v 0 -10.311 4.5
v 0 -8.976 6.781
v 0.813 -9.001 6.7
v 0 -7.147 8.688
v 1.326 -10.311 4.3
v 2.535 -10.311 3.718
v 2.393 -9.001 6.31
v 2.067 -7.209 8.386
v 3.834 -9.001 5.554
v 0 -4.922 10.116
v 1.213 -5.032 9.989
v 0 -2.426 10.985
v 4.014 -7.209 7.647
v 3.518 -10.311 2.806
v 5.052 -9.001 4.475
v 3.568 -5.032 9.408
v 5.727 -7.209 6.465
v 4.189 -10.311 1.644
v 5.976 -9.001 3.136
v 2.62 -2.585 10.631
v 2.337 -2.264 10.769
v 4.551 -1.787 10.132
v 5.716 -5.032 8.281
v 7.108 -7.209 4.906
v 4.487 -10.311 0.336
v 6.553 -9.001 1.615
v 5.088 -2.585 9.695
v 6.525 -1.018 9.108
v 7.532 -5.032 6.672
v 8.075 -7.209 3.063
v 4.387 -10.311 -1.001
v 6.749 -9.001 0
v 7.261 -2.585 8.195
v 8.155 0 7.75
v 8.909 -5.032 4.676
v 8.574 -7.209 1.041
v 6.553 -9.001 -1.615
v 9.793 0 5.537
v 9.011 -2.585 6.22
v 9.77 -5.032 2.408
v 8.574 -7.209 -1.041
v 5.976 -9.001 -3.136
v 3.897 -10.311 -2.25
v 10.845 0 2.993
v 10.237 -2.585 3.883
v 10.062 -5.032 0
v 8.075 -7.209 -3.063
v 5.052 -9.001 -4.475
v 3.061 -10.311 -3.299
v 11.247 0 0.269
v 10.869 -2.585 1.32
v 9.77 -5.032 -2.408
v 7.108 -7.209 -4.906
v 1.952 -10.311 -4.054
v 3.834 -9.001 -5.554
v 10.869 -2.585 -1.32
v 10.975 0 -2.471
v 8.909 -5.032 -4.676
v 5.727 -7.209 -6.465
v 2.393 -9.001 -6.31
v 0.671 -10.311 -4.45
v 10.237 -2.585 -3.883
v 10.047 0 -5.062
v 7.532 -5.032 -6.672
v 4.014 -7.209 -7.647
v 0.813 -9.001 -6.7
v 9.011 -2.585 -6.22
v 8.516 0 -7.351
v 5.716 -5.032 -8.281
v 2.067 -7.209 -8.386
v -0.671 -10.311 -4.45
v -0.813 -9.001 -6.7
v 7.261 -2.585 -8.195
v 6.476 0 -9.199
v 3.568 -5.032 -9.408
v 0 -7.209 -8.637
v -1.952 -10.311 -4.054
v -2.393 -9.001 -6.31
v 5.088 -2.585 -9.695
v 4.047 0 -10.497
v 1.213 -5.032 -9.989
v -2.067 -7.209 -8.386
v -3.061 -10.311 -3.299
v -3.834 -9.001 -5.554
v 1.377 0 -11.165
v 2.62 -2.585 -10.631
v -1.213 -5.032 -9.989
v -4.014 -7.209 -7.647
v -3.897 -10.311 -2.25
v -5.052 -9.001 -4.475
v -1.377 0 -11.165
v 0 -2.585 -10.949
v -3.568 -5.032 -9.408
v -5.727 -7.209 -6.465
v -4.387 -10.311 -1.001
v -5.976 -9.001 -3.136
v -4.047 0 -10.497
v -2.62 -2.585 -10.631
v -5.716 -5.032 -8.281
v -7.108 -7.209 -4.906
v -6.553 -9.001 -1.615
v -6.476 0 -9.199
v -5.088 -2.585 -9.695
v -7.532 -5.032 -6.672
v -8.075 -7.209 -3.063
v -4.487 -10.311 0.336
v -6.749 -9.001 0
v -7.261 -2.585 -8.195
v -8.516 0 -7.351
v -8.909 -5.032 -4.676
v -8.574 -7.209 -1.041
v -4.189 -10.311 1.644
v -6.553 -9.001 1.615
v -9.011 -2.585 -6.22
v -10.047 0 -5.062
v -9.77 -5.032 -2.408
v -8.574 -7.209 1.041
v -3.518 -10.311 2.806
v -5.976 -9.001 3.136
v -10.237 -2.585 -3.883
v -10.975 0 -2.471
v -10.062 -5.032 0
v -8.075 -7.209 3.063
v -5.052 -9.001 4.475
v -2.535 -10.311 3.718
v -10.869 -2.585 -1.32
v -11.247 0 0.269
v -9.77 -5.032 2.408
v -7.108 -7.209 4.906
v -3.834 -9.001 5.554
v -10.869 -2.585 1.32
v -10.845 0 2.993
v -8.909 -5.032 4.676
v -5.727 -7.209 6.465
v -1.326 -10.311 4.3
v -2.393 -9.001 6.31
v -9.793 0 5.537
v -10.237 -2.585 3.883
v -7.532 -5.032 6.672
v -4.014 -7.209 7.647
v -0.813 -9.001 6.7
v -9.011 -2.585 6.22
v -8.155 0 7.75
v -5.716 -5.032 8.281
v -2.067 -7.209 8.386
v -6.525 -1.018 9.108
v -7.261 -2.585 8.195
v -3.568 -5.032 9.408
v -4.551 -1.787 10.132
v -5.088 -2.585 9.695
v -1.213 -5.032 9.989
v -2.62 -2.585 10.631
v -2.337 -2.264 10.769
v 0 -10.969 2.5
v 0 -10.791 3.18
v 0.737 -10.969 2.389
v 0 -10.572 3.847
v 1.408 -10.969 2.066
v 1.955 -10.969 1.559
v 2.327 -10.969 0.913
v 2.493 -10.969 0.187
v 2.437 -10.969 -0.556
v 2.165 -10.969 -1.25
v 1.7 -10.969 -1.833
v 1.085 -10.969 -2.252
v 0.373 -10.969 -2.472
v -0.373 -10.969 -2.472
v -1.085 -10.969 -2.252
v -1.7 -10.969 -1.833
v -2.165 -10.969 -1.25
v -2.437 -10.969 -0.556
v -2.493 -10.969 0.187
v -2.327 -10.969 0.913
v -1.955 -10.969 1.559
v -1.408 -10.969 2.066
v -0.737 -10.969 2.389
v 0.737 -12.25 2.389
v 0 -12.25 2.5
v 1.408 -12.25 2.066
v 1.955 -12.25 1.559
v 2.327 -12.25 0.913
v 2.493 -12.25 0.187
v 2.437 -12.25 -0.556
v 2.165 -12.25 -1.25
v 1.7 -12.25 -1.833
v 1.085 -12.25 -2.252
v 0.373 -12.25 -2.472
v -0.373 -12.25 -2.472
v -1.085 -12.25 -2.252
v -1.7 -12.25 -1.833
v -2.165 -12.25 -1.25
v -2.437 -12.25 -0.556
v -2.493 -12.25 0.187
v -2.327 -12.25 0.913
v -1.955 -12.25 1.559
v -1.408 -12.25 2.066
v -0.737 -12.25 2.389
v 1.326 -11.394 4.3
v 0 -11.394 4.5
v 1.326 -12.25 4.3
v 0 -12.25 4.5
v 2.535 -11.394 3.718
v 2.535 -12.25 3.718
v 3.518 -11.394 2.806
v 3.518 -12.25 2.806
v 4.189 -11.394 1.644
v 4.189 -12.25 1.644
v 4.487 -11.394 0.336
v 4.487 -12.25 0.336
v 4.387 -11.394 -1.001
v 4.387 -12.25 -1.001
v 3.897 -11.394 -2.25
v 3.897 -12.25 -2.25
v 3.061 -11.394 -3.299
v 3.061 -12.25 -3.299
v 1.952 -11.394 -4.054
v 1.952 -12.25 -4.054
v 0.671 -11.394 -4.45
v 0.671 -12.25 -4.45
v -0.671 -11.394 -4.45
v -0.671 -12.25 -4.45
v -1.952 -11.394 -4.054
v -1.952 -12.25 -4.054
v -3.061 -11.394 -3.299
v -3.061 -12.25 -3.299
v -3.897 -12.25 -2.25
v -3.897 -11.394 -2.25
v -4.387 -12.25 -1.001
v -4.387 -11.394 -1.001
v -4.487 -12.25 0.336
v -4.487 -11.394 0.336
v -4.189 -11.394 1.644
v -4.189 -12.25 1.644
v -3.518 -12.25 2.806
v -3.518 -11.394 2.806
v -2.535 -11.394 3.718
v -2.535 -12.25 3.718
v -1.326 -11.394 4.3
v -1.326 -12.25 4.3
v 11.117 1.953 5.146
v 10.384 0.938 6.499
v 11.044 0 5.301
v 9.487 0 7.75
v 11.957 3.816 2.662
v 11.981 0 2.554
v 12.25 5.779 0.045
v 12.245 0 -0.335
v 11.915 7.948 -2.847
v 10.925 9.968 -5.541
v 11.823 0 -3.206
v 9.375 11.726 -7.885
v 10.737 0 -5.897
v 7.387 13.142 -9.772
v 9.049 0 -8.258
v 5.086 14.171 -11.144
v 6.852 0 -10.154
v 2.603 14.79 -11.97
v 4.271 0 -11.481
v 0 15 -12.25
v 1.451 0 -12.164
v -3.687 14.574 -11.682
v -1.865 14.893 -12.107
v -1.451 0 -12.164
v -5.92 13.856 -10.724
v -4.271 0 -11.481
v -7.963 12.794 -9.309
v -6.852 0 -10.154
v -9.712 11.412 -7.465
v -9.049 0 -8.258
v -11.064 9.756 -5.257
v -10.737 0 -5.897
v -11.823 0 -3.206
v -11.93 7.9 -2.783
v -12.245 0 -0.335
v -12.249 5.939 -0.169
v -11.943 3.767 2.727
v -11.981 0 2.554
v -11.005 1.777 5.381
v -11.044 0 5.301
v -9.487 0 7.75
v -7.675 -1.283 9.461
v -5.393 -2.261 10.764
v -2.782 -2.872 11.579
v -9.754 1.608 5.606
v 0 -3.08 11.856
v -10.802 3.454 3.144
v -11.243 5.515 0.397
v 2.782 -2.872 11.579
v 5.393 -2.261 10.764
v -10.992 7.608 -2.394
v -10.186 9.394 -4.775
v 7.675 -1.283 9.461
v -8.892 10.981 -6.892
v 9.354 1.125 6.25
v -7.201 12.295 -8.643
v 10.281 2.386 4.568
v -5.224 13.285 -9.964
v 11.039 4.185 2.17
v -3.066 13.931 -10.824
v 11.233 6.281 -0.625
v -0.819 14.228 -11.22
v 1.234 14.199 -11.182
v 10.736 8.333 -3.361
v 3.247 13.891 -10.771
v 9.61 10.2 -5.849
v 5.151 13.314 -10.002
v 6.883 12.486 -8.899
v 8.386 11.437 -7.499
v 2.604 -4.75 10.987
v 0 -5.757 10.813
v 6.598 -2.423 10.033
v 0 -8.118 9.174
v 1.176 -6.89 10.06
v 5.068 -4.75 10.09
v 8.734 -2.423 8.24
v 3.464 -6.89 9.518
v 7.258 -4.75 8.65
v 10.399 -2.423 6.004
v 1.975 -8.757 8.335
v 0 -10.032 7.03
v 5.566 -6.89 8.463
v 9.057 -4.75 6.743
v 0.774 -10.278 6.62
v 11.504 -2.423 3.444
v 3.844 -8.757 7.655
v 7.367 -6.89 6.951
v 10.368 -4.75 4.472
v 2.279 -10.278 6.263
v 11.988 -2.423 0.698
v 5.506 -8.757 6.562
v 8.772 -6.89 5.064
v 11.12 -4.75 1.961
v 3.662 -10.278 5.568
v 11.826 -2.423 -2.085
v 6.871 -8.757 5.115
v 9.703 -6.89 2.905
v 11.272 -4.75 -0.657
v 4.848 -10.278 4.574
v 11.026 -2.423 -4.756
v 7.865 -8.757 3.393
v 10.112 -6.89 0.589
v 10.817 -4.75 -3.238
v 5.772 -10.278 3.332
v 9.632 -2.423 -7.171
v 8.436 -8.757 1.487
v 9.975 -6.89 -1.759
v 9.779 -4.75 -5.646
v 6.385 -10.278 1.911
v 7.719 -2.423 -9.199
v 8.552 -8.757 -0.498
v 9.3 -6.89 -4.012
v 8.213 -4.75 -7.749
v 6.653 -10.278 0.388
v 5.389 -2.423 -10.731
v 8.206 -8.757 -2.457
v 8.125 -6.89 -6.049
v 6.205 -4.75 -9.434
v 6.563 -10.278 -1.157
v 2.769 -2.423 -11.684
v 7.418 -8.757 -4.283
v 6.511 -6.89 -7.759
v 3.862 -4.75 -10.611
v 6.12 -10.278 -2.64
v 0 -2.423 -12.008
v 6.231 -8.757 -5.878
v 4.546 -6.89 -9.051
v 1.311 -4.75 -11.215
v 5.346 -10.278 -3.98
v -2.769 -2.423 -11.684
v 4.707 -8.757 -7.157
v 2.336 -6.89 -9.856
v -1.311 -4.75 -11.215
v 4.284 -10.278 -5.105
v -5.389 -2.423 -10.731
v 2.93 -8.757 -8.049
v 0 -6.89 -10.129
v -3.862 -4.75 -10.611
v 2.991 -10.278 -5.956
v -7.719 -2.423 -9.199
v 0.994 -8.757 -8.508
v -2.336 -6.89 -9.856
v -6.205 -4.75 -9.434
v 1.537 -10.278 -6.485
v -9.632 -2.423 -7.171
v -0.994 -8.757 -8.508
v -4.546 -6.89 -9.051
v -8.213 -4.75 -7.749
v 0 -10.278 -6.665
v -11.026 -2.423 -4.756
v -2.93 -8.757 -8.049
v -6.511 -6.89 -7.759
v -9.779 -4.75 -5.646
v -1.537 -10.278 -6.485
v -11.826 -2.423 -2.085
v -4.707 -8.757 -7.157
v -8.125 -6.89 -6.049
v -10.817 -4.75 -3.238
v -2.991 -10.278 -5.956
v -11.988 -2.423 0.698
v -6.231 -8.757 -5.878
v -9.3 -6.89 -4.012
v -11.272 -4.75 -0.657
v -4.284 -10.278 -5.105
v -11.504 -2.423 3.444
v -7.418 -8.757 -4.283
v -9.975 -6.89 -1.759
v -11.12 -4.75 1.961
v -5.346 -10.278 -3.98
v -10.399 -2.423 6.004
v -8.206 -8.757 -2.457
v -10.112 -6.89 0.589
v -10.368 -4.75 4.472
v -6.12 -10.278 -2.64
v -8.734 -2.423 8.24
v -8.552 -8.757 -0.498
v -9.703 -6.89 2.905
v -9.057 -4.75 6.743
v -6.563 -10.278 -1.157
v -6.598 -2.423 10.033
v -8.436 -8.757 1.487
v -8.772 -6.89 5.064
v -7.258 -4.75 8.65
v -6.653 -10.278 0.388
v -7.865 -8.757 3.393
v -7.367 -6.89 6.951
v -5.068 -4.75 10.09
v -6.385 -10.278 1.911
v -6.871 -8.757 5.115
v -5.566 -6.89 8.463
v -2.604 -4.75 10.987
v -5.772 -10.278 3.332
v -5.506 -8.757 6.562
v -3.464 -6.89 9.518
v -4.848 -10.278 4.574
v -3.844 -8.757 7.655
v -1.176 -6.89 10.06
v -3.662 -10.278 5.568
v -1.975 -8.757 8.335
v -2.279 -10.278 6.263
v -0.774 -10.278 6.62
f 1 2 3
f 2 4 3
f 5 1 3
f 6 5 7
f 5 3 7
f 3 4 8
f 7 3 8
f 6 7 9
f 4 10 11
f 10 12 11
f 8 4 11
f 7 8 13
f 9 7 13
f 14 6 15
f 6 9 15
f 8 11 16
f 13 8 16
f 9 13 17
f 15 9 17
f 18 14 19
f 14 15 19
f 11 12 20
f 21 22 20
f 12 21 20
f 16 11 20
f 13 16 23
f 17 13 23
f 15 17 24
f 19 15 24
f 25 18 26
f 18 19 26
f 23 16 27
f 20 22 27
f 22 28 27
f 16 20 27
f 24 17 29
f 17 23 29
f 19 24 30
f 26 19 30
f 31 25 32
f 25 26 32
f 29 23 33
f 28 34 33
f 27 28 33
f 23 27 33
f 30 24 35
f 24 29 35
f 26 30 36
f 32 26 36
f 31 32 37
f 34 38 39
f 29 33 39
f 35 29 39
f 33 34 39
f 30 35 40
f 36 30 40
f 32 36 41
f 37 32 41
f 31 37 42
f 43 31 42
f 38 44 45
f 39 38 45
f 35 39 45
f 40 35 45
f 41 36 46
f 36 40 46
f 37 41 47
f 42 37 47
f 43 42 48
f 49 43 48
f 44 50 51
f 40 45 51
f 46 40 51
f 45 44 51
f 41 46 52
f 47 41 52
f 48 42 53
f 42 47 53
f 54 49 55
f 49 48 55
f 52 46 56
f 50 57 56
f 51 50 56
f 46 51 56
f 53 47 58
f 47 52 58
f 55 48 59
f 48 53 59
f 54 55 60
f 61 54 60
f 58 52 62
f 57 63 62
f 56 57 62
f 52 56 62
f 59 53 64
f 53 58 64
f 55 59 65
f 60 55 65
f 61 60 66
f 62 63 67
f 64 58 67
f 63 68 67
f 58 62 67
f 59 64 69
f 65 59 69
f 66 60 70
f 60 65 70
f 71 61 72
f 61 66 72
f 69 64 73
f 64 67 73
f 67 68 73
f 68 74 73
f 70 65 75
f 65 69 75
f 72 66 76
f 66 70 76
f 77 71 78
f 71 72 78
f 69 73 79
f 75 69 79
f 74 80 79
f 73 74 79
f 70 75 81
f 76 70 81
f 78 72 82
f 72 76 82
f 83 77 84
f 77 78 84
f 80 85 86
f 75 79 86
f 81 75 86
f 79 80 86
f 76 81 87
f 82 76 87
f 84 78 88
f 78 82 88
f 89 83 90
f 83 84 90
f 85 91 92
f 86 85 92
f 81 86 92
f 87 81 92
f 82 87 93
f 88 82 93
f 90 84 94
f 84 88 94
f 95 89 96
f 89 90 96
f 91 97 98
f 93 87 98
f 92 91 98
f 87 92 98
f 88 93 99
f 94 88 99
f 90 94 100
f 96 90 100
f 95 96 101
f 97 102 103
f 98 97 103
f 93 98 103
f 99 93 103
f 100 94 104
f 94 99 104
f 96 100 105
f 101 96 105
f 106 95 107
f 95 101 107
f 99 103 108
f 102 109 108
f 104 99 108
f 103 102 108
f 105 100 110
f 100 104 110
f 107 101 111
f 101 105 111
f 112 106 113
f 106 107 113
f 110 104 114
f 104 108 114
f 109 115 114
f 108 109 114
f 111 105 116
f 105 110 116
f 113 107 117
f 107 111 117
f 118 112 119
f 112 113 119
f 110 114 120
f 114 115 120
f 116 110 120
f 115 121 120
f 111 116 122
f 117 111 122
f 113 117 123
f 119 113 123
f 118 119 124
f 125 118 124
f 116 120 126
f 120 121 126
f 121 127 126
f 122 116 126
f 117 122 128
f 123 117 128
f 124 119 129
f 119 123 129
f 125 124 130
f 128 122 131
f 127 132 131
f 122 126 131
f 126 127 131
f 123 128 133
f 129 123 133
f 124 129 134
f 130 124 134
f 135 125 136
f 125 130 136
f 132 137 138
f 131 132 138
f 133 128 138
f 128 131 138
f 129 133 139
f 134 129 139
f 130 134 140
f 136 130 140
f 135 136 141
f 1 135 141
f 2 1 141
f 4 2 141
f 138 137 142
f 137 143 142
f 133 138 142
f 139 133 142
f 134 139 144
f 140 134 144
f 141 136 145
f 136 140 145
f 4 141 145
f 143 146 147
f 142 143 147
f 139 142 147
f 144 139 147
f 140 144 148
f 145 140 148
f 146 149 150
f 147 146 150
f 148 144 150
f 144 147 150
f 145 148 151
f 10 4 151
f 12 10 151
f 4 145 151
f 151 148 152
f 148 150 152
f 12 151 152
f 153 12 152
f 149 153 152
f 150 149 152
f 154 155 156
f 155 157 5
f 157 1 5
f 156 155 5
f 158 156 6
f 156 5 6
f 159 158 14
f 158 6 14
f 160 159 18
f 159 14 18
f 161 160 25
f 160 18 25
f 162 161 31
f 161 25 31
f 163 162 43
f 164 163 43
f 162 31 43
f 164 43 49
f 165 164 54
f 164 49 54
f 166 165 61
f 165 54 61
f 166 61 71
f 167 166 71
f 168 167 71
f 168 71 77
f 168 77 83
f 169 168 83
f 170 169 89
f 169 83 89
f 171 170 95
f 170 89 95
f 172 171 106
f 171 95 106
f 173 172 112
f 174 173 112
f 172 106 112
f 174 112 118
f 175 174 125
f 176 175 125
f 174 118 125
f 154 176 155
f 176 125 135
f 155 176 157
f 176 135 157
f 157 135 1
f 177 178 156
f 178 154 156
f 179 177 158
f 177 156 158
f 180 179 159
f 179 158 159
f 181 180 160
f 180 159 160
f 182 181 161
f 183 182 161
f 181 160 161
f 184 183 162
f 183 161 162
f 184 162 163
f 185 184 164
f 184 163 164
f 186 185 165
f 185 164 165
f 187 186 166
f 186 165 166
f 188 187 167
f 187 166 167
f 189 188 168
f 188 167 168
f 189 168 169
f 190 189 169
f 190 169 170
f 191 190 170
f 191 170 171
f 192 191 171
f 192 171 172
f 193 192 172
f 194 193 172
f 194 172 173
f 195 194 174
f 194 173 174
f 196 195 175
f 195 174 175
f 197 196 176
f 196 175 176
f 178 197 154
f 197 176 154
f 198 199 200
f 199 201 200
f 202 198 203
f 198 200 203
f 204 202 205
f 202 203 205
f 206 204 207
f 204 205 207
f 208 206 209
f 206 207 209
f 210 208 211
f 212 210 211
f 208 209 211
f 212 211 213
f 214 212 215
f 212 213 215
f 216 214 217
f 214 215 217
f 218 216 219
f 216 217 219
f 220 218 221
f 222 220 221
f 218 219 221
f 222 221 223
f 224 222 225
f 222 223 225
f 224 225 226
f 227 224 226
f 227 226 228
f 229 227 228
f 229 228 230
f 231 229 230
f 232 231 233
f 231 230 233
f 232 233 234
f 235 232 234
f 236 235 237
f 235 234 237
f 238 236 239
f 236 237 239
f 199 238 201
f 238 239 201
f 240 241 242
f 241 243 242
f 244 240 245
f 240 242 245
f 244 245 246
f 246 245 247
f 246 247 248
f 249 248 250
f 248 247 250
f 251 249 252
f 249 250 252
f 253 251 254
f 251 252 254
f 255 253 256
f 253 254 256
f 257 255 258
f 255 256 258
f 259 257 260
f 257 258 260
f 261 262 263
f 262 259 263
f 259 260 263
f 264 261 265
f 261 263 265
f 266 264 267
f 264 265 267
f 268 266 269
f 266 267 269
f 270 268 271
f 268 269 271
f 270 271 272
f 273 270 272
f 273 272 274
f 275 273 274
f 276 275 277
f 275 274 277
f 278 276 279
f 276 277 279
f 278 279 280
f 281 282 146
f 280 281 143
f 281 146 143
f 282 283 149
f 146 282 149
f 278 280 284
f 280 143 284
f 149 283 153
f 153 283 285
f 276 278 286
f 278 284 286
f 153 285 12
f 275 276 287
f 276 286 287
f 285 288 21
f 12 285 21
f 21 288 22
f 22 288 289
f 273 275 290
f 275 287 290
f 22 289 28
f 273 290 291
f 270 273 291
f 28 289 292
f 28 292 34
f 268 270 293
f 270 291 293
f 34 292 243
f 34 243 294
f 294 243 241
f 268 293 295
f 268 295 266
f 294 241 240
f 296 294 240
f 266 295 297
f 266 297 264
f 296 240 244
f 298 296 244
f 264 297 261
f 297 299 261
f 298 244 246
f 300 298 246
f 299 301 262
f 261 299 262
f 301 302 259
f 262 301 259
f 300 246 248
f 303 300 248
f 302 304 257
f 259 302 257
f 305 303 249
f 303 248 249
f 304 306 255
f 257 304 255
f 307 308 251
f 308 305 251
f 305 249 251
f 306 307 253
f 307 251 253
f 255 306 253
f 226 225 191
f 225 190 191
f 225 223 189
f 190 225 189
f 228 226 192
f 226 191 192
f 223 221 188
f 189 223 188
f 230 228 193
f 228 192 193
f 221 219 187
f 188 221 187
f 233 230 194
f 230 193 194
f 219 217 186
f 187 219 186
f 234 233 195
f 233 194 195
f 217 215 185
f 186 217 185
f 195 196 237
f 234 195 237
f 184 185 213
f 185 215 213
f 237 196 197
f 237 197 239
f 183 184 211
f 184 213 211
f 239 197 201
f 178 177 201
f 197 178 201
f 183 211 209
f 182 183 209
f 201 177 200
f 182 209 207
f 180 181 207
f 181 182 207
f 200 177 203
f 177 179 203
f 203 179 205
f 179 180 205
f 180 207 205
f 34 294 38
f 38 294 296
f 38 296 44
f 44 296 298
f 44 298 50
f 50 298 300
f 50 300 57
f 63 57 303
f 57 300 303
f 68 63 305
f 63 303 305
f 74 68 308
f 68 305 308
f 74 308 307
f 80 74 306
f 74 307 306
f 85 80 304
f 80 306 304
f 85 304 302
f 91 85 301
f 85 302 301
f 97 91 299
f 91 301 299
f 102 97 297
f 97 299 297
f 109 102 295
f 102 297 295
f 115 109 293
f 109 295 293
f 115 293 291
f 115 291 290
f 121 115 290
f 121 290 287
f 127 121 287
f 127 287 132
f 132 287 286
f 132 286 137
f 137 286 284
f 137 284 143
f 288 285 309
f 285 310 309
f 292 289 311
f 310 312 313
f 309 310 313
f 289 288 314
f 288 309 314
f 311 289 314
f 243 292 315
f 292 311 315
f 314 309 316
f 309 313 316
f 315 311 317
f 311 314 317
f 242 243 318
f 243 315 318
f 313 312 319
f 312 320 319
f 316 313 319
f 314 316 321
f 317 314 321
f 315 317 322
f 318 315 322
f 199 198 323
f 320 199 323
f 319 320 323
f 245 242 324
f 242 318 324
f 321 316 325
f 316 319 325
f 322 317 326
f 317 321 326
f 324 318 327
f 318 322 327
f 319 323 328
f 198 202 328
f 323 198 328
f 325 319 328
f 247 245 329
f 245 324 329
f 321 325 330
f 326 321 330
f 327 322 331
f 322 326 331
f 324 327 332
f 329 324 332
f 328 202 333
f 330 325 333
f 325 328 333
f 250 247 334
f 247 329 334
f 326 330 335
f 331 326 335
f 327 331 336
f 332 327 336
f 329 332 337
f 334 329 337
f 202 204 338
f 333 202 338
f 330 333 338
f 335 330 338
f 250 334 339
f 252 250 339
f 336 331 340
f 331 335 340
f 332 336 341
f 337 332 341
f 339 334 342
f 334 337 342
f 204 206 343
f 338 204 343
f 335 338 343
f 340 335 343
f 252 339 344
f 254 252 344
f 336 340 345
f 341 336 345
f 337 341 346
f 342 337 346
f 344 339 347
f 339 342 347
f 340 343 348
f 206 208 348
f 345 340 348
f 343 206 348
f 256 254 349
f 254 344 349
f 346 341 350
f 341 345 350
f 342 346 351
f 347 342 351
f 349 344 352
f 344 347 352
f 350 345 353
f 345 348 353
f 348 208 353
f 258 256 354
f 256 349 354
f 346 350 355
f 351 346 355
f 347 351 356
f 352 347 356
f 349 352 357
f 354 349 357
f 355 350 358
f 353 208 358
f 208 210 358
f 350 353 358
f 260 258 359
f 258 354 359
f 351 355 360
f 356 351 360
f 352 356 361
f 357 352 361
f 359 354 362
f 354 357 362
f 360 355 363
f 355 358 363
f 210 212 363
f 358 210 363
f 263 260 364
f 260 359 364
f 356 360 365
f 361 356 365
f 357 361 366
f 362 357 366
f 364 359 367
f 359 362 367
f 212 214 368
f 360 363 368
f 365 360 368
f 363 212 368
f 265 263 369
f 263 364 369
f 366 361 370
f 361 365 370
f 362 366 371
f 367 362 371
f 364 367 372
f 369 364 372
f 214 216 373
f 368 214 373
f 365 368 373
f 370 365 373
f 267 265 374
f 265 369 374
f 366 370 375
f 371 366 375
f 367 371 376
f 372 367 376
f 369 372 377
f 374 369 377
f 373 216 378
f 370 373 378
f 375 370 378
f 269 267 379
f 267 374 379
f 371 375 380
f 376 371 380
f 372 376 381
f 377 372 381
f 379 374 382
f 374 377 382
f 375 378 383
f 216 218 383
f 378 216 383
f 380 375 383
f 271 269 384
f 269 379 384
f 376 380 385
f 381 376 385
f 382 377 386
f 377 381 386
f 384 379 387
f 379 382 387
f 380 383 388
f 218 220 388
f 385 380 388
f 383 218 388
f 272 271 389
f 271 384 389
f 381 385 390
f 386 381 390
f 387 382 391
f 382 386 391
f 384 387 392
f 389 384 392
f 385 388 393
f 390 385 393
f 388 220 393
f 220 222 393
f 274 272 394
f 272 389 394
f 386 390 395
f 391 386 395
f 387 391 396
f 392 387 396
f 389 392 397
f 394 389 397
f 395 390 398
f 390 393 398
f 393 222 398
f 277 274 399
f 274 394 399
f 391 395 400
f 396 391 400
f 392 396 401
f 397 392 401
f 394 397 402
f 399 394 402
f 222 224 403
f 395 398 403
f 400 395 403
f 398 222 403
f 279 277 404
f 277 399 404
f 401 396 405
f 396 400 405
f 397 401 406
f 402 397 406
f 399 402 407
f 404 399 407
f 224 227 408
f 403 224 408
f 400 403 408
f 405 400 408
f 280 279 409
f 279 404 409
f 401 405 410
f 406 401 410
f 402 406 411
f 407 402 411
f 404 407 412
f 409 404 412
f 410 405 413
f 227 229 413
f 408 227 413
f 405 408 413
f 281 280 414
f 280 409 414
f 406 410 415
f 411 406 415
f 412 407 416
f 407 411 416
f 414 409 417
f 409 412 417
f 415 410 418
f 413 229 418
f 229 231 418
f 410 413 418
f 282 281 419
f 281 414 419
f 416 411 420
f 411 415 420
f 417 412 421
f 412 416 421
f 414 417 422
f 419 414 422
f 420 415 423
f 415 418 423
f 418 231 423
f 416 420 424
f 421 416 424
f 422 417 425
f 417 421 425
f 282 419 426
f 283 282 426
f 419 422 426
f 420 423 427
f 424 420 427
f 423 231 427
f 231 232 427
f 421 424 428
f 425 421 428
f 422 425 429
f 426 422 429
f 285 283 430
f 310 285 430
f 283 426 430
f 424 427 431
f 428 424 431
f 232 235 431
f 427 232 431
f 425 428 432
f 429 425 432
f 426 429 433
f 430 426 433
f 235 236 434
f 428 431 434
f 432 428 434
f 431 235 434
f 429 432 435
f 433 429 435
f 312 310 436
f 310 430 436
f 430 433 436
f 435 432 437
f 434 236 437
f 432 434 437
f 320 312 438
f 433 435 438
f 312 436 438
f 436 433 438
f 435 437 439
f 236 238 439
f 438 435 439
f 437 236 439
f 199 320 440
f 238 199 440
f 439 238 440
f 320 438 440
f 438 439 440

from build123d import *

# Parameters (mm, degrees)
F3_DEPTH = 15


with BuildPart() as f1:
    # F0 (on Right) → F1 (revolve)
    with BuildSketch(Plane.YZ):
        with BuildLine():
            Line((15, 12.25), (1.288e-07, 12.25))
            ThreePointArc((1.288e-07, 12.25), (-6.8897568365, 10.1288573262), (-11.3935288651, 4.5))
            Line((-11.3935288651, 4.5), (-10.3107953137, 4.5))
            ThreePointArc((-10.3107953137, 4.5), (-6.1618787719, 9.4124252985), (0, 11.25))
            Line((0, 11.25), (15, 11.25))
            Line((15, 11.25), (15, 12.25))
        make_face()
        with BuildLine():
            Line((-10.3107953137, 4.5), (-11.3935288651, 4.5))
            ThreePointArc((-11.3935288651, 4.5), (-11.7355401547, 3.5127762921), (-11.9921849552, 2.5))
            Line((-11.9921849552, 2.5), (-10.9687054842, 2.5))
            ThreePointArc((-10.9687054842, 2.5), (-10.6866406579, 3.5154247891), (-10.3107953137, 4.5))
        make_face()
        with BuildLine():
            ThreePointArc((-11.9921849552, 2.5), (-11.7355401547, 3.5127762921), (-11.3935288651, 4.5))
            Line((-11.3935288651, 4.5), (-12.25, 4.5))
            Line((-12.25, 4.5), (-12.25, 2.5))
            Line((-12.25, 2.5), (-11.9921849552, 2.5))
        make_face()
    revolve(axis=Axis((0, 1.375, 3.22e-08), (0, 1, -2.4e-09)))

    # F2 (on Right) → F3 (cut, symmetric)
    with BuildSketch(Plane.YZ):
        Polygon((-12.7222961238, 24.7129239332), (15, -12.25), (15, 24.7129239332), align=None)
    extrude(amount=F3_DEPTH, both=True, mode=Mode.SUBTRACT)


solid = f1.part
